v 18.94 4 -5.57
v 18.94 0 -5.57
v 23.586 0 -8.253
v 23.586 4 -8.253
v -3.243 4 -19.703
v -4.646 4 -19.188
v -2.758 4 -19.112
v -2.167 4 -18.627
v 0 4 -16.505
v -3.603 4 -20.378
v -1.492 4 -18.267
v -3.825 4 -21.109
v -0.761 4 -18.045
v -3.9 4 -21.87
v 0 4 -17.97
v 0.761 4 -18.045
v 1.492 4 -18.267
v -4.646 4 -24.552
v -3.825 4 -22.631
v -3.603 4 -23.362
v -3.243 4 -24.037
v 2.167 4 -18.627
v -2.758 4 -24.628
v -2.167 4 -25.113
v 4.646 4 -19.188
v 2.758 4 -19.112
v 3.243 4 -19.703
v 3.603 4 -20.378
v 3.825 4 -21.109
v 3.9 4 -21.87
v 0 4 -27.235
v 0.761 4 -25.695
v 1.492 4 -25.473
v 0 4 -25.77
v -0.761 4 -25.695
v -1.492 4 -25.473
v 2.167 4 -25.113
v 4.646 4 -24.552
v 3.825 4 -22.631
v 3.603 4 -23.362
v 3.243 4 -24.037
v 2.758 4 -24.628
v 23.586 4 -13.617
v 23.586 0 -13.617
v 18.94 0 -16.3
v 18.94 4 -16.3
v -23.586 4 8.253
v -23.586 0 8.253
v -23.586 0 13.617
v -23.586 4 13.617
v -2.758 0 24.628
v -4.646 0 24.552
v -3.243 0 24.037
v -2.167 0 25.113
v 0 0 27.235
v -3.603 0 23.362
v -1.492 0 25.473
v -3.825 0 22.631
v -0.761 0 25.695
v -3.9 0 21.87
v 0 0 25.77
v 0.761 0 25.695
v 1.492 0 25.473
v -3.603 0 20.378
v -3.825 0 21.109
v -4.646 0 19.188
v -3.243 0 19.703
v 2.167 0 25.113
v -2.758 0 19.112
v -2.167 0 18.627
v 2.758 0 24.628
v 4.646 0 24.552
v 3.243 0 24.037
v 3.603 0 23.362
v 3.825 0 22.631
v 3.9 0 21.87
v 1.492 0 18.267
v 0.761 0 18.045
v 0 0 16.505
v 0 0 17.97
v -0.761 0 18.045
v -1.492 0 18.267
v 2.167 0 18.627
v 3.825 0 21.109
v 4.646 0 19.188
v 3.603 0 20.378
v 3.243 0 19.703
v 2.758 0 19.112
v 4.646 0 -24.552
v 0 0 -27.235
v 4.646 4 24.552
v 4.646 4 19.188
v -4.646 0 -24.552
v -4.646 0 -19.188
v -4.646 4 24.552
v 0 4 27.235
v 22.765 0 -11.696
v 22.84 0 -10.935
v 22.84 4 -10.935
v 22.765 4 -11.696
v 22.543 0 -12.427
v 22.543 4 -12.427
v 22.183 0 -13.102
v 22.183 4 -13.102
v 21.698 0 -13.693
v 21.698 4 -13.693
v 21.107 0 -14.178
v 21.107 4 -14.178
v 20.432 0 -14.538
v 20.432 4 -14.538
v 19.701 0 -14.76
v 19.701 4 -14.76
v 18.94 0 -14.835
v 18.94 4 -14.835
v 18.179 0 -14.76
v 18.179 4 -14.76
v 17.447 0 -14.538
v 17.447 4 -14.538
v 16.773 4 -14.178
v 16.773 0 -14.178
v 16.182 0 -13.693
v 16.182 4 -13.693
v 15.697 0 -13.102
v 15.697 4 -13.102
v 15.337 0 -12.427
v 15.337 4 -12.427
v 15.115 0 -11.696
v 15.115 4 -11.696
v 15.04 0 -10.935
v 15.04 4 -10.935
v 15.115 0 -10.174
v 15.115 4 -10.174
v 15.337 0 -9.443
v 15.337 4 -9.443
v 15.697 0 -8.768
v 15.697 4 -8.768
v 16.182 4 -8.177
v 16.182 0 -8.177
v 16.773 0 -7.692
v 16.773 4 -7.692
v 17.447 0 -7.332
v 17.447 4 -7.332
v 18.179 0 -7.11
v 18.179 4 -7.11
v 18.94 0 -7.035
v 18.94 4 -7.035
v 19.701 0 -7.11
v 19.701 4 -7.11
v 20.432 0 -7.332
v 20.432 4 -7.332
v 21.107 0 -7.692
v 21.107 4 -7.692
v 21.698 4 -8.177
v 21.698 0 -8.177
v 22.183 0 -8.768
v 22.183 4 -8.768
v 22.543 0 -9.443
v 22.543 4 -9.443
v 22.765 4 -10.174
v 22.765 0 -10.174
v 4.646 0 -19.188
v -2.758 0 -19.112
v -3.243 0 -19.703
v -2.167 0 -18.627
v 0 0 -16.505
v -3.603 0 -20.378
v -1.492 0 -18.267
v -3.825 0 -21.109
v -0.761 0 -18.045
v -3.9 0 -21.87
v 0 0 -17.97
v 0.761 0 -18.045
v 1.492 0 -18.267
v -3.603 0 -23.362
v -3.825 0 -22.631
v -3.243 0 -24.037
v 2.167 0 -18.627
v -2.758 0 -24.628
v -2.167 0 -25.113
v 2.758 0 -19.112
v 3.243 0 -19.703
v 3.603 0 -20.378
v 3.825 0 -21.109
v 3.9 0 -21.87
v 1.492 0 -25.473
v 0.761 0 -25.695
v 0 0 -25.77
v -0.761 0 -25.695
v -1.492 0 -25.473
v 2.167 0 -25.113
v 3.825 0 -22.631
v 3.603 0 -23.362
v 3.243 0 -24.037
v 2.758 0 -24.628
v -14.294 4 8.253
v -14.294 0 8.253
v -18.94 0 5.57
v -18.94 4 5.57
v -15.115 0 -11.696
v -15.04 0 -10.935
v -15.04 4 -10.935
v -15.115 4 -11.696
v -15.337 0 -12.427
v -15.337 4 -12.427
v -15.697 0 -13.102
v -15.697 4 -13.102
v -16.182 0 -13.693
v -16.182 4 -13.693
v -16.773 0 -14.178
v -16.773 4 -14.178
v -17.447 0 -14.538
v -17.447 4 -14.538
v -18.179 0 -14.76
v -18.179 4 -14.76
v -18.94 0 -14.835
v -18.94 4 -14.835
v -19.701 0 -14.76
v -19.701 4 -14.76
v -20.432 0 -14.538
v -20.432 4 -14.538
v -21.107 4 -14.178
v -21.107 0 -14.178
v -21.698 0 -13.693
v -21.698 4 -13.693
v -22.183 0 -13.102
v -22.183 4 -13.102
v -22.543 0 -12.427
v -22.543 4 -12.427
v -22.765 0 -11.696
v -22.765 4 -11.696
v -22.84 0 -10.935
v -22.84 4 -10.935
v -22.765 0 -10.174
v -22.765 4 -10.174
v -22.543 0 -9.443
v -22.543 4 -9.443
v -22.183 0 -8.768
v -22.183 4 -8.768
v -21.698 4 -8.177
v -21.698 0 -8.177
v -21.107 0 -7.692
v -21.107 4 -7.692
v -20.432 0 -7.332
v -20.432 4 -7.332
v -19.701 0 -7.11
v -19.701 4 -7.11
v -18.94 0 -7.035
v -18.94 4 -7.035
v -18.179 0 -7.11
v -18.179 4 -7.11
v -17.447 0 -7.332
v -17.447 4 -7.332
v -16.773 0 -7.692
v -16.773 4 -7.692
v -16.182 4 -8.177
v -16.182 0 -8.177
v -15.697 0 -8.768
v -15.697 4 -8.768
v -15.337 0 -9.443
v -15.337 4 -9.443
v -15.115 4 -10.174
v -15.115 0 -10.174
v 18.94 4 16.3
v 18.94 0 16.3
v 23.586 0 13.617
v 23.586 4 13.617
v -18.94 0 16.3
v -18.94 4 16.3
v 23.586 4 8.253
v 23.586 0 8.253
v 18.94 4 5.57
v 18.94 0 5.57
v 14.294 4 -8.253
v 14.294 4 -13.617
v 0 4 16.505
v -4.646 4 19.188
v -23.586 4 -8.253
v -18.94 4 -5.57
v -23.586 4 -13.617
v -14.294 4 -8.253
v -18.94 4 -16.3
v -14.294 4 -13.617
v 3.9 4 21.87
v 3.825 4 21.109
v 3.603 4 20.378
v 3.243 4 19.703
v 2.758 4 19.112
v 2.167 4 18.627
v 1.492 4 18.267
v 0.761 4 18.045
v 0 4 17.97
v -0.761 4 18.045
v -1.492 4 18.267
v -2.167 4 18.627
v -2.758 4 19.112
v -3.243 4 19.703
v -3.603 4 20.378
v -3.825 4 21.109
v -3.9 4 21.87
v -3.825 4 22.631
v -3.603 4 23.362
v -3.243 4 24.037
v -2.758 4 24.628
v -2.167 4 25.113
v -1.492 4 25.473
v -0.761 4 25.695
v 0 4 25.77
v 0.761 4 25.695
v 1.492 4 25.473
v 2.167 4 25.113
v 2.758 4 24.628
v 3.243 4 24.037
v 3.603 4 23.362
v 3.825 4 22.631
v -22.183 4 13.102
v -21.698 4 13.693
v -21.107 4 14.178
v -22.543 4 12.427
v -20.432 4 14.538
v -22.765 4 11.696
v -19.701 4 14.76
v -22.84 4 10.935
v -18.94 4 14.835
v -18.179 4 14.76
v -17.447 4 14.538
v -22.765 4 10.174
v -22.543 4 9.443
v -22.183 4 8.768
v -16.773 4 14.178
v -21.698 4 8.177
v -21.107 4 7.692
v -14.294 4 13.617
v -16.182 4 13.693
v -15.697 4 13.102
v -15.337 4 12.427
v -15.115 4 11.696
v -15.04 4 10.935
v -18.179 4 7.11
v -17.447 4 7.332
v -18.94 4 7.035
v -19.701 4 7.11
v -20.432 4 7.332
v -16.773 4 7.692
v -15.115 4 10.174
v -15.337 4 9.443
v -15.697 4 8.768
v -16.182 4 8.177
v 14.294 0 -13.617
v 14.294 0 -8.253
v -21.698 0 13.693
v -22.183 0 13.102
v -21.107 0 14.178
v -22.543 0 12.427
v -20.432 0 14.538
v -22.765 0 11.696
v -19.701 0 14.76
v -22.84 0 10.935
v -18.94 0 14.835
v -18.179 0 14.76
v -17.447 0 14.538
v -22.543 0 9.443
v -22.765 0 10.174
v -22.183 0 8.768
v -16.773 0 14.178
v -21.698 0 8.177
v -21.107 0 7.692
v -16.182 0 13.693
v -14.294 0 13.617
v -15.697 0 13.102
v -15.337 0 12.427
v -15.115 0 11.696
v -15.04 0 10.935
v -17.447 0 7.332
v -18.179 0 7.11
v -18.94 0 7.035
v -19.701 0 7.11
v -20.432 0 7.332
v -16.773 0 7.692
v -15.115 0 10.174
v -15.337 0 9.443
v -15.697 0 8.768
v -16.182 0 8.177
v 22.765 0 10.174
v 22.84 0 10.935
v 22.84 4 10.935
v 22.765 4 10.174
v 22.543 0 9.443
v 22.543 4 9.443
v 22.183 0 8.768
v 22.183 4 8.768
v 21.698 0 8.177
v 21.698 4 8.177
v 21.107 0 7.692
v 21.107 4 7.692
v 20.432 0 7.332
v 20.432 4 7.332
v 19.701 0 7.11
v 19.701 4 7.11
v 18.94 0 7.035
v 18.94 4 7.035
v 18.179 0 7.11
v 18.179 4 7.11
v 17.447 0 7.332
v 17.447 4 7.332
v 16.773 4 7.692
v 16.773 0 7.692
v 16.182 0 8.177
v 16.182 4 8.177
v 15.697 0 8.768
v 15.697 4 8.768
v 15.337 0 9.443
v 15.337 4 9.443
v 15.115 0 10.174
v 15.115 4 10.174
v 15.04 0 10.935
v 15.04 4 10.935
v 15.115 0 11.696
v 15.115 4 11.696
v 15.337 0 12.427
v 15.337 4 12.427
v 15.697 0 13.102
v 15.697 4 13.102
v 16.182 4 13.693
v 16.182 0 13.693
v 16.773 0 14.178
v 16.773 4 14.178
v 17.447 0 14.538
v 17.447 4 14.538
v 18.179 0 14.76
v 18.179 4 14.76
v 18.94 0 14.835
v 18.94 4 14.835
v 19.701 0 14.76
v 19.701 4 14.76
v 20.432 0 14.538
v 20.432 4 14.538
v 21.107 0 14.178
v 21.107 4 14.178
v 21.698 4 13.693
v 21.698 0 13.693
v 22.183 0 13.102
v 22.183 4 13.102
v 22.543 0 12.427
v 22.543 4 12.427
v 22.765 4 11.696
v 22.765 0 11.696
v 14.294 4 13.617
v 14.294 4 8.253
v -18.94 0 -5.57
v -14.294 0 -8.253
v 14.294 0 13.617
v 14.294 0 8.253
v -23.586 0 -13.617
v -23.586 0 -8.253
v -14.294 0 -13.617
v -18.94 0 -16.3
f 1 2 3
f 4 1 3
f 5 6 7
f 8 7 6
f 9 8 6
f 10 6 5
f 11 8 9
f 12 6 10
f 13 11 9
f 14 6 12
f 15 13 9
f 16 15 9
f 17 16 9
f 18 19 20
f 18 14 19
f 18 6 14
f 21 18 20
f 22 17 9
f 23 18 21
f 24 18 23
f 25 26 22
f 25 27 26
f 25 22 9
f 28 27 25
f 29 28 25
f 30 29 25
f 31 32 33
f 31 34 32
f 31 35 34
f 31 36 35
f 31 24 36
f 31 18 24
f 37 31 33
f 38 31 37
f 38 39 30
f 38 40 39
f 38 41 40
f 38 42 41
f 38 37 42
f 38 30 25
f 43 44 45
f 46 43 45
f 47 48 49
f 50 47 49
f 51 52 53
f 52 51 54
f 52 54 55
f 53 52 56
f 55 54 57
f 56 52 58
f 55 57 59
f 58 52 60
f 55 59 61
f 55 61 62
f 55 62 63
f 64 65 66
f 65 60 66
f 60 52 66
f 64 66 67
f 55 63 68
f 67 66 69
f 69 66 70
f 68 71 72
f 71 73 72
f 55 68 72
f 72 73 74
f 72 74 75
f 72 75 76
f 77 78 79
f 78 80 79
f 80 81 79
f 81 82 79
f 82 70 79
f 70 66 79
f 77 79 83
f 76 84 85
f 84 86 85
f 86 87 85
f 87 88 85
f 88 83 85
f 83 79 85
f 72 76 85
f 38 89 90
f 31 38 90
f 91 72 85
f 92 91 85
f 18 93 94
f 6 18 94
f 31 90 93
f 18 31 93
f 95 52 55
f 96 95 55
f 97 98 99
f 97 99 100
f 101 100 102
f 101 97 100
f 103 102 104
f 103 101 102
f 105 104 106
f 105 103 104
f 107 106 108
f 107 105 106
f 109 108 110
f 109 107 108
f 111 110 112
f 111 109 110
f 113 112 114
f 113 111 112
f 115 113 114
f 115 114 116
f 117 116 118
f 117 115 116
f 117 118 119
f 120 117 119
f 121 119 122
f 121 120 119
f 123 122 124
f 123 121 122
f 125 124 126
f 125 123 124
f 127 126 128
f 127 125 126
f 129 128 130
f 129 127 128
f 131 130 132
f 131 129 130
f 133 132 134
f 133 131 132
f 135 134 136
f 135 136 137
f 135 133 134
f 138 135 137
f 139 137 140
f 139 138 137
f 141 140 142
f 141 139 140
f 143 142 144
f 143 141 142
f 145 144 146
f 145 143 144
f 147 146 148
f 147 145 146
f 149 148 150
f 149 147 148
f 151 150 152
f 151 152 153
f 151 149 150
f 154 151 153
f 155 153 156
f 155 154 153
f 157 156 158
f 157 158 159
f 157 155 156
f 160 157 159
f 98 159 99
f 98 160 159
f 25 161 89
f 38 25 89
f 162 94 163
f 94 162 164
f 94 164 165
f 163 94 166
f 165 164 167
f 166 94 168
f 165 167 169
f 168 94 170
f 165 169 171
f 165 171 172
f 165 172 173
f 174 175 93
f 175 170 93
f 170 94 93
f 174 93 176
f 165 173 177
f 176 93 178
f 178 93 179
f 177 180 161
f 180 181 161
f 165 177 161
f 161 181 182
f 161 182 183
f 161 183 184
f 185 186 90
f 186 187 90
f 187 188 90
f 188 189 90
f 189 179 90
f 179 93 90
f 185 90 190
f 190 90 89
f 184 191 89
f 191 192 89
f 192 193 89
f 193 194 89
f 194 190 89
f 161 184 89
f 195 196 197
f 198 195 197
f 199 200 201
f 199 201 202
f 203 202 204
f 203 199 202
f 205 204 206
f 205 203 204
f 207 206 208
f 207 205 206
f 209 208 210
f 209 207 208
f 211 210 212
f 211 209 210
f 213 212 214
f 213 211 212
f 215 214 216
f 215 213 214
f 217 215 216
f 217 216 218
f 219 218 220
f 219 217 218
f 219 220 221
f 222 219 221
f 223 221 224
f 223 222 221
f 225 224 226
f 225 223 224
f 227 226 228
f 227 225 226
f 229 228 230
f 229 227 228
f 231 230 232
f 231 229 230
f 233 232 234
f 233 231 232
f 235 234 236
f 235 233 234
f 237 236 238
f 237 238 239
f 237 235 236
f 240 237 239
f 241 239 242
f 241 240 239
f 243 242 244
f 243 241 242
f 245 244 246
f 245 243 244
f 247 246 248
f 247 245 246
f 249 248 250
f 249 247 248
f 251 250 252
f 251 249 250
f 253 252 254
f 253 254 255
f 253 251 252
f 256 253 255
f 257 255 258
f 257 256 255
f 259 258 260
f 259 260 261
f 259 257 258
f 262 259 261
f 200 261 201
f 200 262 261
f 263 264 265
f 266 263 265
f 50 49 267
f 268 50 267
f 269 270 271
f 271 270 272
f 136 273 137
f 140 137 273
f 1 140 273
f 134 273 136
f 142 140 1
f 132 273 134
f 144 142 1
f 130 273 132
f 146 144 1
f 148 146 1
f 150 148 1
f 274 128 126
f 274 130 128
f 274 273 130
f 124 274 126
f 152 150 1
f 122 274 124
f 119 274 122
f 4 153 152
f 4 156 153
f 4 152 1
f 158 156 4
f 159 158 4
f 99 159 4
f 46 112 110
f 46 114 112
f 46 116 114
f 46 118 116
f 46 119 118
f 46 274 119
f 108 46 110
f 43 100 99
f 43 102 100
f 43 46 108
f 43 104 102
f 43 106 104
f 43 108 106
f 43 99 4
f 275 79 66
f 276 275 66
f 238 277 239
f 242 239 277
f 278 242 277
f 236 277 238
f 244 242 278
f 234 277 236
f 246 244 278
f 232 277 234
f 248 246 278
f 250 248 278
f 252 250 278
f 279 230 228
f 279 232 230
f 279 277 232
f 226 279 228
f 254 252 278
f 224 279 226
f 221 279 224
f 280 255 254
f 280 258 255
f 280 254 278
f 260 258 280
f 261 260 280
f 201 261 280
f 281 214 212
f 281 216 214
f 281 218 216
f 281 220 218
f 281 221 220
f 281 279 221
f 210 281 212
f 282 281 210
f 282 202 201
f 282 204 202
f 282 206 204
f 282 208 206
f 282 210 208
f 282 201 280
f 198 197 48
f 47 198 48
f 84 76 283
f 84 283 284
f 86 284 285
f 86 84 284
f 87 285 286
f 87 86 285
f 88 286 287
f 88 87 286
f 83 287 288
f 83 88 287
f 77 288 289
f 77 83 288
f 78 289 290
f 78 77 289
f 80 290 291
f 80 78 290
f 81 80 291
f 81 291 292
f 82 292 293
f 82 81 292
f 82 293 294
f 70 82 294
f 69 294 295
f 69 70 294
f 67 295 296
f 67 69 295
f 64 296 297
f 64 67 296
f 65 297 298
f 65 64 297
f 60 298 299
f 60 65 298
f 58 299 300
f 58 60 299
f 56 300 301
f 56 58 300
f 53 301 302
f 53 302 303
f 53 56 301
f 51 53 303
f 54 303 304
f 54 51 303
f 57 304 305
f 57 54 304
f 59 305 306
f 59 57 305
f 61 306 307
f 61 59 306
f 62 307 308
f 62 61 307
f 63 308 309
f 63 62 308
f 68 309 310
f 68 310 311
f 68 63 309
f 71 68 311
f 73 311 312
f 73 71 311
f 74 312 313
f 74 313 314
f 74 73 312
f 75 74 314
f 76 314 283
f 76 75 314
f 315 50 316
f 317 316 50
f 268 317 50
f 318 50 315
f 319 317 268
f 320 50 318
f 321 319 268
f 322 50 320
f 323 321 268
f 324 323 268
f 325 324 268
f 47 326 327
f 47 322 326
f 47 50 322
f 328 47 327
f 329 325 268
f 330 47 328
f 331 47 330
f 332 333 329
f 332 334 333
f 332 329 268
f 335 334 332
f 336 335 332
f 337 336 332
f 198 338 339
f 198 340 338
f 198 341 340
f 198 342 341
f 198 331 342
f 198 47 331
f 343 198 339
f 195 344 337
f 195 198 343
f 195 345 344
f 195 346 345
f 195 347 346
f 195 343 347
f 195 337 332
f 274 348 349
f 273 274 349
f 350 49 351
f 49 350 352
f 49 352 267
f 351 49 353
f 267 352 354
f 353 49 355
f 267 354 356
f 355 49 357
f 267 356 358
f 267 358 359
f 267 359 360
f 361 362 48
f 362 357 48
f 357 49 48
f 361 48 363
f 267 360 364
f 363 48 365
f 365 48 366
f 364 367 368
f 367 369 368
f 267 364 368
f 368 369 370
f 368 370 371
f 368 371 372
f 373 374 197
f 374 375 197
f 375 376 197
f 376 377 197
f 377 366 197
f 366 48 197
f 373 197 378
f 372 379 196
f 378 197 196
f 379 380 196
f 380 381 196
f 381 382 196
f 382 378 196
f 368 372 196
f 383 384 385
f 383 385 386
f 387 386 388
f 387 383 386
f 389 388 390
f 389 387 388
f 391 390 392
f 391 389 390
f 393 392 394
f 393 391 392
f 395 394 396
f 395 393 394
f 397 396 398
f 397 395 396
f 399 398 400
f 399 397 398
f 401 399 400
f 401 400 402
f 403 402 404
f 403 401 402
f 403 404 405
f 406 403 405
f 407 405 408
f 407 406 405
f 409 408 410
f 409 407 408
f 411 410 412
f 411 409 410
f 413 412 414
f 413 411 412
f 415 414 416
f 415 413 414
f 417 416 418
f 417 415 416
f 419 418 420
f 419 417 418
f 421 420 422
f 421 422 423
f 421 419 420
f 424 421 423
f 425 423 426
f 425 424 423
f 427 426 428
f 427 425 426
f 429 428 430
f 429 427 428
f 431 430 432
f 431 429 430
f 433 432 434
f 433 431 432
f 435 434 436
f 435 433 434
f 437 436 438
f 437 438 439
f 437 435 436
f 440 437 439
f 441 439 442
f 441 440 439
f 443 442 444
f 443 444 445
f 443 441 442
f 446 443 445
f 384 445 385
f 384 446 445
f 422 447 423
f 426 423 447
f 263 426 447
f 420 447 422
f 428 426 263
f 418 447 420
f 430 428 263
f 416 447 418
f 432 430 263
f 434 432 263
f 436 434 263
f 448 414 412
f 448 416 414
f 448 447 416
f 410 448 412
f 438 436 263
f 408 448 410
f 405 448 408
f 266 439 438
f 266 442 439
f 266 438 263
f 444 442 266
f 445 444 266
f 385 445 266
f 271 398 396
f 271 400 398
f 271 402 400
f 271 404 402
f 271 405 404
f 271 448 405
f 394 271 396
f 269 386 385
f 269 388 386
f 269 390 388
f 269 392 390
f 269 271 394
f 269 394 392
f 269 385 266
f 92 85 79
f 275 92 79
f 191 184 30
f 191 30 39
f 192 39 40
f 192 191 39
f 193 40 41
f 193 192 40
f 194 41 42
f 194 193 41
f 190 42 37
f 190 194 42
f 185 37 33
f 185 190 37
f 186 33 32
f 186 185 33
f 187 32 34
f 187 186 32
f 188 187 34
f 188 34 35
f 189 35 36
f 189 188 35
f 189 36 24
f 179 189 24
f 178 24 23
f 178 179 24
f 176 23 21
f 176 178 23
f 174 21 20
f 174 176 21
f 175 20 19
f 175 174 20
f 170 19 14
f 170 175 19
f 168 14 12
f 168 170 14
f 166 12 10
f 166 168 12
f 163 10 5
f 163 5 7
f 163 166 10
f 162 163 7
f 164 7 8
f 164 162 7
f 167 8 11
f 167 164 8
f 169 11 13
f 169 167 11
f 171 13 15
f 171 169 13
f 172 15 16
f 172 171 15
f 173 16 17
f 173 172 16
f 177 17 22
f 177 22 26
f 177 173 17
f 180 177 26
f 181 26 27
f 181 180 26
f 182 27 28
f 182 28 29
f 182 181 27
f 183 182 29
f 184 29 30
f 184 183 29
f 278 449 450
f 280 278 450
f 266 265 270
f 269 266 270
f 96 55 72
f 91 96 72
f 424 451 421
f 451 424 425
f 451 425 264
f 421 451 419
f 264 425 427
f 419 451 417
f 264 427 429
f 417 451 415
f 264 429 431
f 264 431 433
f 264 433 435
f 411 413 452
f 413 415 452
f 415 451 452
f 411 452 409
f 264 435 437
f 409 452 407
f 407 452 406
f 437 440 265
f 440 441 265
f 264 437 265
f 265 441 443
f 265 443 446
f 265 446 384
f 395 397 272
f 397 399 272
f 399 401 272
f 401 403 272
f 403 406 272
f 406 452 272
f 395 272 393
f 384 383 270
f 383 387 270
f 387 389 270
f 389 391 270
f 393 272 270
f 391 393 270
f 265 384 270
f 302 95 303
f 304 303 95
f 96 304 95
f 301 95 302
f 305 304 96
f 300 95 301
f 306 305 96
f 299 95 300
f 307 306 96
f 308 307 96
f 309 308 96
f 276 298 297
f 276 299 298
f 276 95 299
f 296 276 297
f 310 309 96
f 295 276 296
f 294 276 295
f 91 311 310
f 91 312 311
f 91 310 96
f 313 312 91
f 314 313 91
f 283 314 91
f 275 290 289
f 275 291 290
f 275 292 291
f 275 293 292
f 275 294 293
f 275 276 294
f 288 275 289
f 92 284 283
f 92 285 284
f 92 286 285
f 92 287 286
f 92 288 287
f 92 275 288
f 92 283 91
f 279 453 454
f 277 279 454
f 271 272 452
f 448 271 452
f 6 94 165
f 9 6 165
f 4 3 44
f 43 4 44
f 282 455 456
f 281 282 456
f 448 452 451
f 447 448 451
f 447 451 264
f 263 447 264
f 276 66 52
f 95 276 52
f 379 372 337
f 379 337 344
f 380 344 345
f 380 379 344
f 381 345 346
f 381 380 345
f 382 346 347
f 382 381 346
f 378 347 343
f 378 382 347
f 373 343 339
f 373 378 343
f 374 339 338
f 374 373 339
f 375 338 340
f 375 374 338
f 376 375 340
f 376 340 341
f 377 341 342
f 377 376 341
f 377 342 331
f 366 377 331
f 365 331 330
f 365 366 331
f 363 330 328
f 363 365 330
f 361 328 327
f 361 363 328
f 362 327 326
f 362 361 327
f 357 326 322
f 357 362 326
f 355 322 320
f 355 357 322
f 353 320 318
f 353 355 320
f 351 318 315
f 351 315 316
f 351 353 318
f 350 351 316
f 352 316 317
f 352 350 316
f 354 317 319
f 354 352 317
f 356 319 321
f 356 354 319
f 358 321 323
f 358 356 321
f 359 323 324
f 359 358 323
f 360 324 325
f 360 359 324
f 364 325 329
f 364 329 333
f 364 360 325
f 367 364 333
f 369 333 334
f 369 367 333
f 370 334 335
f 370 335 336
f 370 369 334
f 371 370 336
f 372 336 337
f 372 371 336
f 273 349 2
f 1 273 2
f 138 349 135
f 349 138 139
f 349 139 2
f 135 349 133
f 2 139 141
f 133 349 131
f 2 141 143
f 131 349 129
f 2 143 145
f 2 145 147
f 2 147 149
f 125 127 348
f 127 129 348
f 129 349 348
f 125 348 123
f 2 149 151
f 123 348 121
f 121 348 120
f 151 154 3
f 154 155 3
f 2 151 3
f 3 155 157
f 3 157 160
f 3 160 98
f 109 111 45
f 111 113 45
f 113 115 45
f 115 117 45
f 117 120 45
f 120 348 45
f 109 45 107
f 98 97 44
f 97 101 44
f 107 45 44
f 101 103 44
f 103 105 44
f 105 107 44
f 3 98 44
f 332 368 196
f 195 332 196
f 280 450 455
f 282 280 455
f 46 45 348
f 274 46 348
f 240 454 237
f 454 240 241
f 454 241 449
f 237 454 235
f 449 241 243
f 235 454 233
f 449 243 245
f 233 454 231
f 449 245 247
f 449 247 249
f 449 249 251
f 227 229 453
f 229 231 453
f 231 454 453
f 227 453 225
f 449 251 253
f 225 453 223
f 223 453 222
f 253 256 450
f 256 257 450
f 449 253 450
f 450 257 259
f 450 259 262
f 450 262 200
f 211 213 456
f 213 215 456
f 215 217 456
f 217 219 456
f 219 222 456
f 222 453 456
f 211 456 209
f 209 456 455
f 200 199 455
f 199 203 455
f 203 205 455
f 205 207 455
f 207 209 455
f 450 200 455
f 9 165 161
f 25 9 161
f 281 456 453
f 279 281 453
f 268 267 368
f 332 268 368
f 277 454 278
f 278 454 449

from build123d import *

# Parameters (mm, degrees)
SKETCH1_R             = 3.9
BOSS_EXTRUDE2_DEPTH   = 4
BOSS_EXTRUDE2_2_DEPTH = 4
BOSS_EXTRUDE2_3_DEPTH = 4
BOSS_EXTRUDE2_4_DEPTH = 4
BOSS_EXTRUDE2_5_DEPTH = 4
BOSS_EXTRUDE2_6_DEPTH = 4


with BuildPart() as part:
    # Sketch1 → Boss-Extrude2 (new body)
    with BuildSketch(Plane(origin=(0, 0, 0), x_dir=(1, 0, 0), z_dir=(0, 1, 0))):
        Polygon((14.294031961, 8.2526632), (18.939948877, 5.570341818), (23.585865794, 8.2526632), (23.585865794, 13.617305965), (18.939948877, 16.299627348), (14.294031961, 13.617305965), align=None)
        with Locations((18.939948877, 10.934984583)):
            Circle(SKETCH1_R, mode=Mode.SUBTRACT)
    extrude(amount=BOSS_EXTRUDE2_DEPTH)


with BuildPart() as body_2:
    # Sketch1 → Boss-Extrude2 2 (new body)
    with BuildSketch(Plane(origin=(0, 0, 0), x_dir=(1, 0, 0), z_dir=(0, 1, 0))):
        Polygon((0, 16.505326401), (4.645916917, 19.187647783), (4.645916917, 24.552290548), (0, 27.23461193), (-4.645916917, 24.552290548), (-4.645916917, 19.187647783), align=None)
        with Locations((0, 21.869969165)):
            Circle(SKETCH1_R, mode=Mode.SUBTRACT)
    extrude(amount=BOSS_EXTRUDE2_2_DEPTH)


with BuildPart() as body_3:
    # Sketch1 → Boss-Extrude2 3 (new body)
    with BuildSketch(Plane(origin=(0, 0, 0), x_dir=(1, 0, 0), z_dir=(0, 1, 0))):
        Polygon((14.294031961, -8.2526632), (14.294031961, -13.617305965), (18.939948877, -16.299627348), (23.585865794, -13.617305965), (23.585865794, -8.2526632), (18.939948877, -5.570341818), align=None)
        with Locations((18.939948877, -10.934984583)):
            Circle(SKETCH1_R, mode=Mode.SUBTRACT)
    extrude(amount=BOSS_EXTRUDE2_3_DEPTH)


with BuildPart() as body_4:
    # Sketch1 → Boss-Extrude2 4 (new body)
    with BuildSketch(Plane(origin=(0, 0, 0), x_dir=(1, 0, 0), z_dir=(0, 1, 0))):
        Polygon((0, -16.505326401), (-4.645916917, -19.187647783), (-4.645916917, -24.552290548), (0, -27.23461193), (4.645916917, -24.552290548), (4.645916917, -19.187647783), align=None)
        with Locations((0, -21.869969165)):
            Circle(SKETCH1_R, mode=Mode.SUBTRACT)
    extrude(amount=BOSS_EXTRUDE2_4_DEPTH)


with BuildPart() as body_5:
    # Sketch1 → Boss-Extrude2 5 (new body)
    with BuildSketch(Plane(origin=(0, 0, 0), x_dir=(1, 0, 0), z_dir=(0, 1, 0))):
        Polygon((-14.294031961, -8.2526632), (-18.939948877, -5.570341818), (-23.585865794, -8.2526632), (-23.585865794, -13.617305965), (-18.939948877, -16.299627348), (-14.294031961, -13.617305965), align=None)
        with Locations((-18.939948877, -10.934984583)):
            Circle(SKETCH1_R, mode=Mode.SUBTRACT)
    extrude(amount=BOSS_EXTRUDE2_5_DEPTH)


with BuildPart() as body_6:
    # Sketch1 → Boss-Extrude2 6 (new body)
    with BuildSketch(Plane(origin=(0, 0, 0), x_dir=(1, 0, 0), z_dir=(0, 1, 0))):
        Polygon((-14.294031961, 8.2526632), (-14.294031961, 13.617305965), (-18.939948877, 16.299627348), (-23.585865794, 13.617305965), (-23.585865794, 8.2526632), (-18.939948877, 5.570341818), align=None)
        with Locations((-18.939948877, 10.934984583)):
            Circle(SKETCH1_R, mode=Mode.SUBTRACT)
    extrude(amount=BOSS_EXTRUDE2_6_DEPTH)


solid = Compound([part.part, body_2.part, body_3.part, body_4.part, body_5.part, body_6.part])
